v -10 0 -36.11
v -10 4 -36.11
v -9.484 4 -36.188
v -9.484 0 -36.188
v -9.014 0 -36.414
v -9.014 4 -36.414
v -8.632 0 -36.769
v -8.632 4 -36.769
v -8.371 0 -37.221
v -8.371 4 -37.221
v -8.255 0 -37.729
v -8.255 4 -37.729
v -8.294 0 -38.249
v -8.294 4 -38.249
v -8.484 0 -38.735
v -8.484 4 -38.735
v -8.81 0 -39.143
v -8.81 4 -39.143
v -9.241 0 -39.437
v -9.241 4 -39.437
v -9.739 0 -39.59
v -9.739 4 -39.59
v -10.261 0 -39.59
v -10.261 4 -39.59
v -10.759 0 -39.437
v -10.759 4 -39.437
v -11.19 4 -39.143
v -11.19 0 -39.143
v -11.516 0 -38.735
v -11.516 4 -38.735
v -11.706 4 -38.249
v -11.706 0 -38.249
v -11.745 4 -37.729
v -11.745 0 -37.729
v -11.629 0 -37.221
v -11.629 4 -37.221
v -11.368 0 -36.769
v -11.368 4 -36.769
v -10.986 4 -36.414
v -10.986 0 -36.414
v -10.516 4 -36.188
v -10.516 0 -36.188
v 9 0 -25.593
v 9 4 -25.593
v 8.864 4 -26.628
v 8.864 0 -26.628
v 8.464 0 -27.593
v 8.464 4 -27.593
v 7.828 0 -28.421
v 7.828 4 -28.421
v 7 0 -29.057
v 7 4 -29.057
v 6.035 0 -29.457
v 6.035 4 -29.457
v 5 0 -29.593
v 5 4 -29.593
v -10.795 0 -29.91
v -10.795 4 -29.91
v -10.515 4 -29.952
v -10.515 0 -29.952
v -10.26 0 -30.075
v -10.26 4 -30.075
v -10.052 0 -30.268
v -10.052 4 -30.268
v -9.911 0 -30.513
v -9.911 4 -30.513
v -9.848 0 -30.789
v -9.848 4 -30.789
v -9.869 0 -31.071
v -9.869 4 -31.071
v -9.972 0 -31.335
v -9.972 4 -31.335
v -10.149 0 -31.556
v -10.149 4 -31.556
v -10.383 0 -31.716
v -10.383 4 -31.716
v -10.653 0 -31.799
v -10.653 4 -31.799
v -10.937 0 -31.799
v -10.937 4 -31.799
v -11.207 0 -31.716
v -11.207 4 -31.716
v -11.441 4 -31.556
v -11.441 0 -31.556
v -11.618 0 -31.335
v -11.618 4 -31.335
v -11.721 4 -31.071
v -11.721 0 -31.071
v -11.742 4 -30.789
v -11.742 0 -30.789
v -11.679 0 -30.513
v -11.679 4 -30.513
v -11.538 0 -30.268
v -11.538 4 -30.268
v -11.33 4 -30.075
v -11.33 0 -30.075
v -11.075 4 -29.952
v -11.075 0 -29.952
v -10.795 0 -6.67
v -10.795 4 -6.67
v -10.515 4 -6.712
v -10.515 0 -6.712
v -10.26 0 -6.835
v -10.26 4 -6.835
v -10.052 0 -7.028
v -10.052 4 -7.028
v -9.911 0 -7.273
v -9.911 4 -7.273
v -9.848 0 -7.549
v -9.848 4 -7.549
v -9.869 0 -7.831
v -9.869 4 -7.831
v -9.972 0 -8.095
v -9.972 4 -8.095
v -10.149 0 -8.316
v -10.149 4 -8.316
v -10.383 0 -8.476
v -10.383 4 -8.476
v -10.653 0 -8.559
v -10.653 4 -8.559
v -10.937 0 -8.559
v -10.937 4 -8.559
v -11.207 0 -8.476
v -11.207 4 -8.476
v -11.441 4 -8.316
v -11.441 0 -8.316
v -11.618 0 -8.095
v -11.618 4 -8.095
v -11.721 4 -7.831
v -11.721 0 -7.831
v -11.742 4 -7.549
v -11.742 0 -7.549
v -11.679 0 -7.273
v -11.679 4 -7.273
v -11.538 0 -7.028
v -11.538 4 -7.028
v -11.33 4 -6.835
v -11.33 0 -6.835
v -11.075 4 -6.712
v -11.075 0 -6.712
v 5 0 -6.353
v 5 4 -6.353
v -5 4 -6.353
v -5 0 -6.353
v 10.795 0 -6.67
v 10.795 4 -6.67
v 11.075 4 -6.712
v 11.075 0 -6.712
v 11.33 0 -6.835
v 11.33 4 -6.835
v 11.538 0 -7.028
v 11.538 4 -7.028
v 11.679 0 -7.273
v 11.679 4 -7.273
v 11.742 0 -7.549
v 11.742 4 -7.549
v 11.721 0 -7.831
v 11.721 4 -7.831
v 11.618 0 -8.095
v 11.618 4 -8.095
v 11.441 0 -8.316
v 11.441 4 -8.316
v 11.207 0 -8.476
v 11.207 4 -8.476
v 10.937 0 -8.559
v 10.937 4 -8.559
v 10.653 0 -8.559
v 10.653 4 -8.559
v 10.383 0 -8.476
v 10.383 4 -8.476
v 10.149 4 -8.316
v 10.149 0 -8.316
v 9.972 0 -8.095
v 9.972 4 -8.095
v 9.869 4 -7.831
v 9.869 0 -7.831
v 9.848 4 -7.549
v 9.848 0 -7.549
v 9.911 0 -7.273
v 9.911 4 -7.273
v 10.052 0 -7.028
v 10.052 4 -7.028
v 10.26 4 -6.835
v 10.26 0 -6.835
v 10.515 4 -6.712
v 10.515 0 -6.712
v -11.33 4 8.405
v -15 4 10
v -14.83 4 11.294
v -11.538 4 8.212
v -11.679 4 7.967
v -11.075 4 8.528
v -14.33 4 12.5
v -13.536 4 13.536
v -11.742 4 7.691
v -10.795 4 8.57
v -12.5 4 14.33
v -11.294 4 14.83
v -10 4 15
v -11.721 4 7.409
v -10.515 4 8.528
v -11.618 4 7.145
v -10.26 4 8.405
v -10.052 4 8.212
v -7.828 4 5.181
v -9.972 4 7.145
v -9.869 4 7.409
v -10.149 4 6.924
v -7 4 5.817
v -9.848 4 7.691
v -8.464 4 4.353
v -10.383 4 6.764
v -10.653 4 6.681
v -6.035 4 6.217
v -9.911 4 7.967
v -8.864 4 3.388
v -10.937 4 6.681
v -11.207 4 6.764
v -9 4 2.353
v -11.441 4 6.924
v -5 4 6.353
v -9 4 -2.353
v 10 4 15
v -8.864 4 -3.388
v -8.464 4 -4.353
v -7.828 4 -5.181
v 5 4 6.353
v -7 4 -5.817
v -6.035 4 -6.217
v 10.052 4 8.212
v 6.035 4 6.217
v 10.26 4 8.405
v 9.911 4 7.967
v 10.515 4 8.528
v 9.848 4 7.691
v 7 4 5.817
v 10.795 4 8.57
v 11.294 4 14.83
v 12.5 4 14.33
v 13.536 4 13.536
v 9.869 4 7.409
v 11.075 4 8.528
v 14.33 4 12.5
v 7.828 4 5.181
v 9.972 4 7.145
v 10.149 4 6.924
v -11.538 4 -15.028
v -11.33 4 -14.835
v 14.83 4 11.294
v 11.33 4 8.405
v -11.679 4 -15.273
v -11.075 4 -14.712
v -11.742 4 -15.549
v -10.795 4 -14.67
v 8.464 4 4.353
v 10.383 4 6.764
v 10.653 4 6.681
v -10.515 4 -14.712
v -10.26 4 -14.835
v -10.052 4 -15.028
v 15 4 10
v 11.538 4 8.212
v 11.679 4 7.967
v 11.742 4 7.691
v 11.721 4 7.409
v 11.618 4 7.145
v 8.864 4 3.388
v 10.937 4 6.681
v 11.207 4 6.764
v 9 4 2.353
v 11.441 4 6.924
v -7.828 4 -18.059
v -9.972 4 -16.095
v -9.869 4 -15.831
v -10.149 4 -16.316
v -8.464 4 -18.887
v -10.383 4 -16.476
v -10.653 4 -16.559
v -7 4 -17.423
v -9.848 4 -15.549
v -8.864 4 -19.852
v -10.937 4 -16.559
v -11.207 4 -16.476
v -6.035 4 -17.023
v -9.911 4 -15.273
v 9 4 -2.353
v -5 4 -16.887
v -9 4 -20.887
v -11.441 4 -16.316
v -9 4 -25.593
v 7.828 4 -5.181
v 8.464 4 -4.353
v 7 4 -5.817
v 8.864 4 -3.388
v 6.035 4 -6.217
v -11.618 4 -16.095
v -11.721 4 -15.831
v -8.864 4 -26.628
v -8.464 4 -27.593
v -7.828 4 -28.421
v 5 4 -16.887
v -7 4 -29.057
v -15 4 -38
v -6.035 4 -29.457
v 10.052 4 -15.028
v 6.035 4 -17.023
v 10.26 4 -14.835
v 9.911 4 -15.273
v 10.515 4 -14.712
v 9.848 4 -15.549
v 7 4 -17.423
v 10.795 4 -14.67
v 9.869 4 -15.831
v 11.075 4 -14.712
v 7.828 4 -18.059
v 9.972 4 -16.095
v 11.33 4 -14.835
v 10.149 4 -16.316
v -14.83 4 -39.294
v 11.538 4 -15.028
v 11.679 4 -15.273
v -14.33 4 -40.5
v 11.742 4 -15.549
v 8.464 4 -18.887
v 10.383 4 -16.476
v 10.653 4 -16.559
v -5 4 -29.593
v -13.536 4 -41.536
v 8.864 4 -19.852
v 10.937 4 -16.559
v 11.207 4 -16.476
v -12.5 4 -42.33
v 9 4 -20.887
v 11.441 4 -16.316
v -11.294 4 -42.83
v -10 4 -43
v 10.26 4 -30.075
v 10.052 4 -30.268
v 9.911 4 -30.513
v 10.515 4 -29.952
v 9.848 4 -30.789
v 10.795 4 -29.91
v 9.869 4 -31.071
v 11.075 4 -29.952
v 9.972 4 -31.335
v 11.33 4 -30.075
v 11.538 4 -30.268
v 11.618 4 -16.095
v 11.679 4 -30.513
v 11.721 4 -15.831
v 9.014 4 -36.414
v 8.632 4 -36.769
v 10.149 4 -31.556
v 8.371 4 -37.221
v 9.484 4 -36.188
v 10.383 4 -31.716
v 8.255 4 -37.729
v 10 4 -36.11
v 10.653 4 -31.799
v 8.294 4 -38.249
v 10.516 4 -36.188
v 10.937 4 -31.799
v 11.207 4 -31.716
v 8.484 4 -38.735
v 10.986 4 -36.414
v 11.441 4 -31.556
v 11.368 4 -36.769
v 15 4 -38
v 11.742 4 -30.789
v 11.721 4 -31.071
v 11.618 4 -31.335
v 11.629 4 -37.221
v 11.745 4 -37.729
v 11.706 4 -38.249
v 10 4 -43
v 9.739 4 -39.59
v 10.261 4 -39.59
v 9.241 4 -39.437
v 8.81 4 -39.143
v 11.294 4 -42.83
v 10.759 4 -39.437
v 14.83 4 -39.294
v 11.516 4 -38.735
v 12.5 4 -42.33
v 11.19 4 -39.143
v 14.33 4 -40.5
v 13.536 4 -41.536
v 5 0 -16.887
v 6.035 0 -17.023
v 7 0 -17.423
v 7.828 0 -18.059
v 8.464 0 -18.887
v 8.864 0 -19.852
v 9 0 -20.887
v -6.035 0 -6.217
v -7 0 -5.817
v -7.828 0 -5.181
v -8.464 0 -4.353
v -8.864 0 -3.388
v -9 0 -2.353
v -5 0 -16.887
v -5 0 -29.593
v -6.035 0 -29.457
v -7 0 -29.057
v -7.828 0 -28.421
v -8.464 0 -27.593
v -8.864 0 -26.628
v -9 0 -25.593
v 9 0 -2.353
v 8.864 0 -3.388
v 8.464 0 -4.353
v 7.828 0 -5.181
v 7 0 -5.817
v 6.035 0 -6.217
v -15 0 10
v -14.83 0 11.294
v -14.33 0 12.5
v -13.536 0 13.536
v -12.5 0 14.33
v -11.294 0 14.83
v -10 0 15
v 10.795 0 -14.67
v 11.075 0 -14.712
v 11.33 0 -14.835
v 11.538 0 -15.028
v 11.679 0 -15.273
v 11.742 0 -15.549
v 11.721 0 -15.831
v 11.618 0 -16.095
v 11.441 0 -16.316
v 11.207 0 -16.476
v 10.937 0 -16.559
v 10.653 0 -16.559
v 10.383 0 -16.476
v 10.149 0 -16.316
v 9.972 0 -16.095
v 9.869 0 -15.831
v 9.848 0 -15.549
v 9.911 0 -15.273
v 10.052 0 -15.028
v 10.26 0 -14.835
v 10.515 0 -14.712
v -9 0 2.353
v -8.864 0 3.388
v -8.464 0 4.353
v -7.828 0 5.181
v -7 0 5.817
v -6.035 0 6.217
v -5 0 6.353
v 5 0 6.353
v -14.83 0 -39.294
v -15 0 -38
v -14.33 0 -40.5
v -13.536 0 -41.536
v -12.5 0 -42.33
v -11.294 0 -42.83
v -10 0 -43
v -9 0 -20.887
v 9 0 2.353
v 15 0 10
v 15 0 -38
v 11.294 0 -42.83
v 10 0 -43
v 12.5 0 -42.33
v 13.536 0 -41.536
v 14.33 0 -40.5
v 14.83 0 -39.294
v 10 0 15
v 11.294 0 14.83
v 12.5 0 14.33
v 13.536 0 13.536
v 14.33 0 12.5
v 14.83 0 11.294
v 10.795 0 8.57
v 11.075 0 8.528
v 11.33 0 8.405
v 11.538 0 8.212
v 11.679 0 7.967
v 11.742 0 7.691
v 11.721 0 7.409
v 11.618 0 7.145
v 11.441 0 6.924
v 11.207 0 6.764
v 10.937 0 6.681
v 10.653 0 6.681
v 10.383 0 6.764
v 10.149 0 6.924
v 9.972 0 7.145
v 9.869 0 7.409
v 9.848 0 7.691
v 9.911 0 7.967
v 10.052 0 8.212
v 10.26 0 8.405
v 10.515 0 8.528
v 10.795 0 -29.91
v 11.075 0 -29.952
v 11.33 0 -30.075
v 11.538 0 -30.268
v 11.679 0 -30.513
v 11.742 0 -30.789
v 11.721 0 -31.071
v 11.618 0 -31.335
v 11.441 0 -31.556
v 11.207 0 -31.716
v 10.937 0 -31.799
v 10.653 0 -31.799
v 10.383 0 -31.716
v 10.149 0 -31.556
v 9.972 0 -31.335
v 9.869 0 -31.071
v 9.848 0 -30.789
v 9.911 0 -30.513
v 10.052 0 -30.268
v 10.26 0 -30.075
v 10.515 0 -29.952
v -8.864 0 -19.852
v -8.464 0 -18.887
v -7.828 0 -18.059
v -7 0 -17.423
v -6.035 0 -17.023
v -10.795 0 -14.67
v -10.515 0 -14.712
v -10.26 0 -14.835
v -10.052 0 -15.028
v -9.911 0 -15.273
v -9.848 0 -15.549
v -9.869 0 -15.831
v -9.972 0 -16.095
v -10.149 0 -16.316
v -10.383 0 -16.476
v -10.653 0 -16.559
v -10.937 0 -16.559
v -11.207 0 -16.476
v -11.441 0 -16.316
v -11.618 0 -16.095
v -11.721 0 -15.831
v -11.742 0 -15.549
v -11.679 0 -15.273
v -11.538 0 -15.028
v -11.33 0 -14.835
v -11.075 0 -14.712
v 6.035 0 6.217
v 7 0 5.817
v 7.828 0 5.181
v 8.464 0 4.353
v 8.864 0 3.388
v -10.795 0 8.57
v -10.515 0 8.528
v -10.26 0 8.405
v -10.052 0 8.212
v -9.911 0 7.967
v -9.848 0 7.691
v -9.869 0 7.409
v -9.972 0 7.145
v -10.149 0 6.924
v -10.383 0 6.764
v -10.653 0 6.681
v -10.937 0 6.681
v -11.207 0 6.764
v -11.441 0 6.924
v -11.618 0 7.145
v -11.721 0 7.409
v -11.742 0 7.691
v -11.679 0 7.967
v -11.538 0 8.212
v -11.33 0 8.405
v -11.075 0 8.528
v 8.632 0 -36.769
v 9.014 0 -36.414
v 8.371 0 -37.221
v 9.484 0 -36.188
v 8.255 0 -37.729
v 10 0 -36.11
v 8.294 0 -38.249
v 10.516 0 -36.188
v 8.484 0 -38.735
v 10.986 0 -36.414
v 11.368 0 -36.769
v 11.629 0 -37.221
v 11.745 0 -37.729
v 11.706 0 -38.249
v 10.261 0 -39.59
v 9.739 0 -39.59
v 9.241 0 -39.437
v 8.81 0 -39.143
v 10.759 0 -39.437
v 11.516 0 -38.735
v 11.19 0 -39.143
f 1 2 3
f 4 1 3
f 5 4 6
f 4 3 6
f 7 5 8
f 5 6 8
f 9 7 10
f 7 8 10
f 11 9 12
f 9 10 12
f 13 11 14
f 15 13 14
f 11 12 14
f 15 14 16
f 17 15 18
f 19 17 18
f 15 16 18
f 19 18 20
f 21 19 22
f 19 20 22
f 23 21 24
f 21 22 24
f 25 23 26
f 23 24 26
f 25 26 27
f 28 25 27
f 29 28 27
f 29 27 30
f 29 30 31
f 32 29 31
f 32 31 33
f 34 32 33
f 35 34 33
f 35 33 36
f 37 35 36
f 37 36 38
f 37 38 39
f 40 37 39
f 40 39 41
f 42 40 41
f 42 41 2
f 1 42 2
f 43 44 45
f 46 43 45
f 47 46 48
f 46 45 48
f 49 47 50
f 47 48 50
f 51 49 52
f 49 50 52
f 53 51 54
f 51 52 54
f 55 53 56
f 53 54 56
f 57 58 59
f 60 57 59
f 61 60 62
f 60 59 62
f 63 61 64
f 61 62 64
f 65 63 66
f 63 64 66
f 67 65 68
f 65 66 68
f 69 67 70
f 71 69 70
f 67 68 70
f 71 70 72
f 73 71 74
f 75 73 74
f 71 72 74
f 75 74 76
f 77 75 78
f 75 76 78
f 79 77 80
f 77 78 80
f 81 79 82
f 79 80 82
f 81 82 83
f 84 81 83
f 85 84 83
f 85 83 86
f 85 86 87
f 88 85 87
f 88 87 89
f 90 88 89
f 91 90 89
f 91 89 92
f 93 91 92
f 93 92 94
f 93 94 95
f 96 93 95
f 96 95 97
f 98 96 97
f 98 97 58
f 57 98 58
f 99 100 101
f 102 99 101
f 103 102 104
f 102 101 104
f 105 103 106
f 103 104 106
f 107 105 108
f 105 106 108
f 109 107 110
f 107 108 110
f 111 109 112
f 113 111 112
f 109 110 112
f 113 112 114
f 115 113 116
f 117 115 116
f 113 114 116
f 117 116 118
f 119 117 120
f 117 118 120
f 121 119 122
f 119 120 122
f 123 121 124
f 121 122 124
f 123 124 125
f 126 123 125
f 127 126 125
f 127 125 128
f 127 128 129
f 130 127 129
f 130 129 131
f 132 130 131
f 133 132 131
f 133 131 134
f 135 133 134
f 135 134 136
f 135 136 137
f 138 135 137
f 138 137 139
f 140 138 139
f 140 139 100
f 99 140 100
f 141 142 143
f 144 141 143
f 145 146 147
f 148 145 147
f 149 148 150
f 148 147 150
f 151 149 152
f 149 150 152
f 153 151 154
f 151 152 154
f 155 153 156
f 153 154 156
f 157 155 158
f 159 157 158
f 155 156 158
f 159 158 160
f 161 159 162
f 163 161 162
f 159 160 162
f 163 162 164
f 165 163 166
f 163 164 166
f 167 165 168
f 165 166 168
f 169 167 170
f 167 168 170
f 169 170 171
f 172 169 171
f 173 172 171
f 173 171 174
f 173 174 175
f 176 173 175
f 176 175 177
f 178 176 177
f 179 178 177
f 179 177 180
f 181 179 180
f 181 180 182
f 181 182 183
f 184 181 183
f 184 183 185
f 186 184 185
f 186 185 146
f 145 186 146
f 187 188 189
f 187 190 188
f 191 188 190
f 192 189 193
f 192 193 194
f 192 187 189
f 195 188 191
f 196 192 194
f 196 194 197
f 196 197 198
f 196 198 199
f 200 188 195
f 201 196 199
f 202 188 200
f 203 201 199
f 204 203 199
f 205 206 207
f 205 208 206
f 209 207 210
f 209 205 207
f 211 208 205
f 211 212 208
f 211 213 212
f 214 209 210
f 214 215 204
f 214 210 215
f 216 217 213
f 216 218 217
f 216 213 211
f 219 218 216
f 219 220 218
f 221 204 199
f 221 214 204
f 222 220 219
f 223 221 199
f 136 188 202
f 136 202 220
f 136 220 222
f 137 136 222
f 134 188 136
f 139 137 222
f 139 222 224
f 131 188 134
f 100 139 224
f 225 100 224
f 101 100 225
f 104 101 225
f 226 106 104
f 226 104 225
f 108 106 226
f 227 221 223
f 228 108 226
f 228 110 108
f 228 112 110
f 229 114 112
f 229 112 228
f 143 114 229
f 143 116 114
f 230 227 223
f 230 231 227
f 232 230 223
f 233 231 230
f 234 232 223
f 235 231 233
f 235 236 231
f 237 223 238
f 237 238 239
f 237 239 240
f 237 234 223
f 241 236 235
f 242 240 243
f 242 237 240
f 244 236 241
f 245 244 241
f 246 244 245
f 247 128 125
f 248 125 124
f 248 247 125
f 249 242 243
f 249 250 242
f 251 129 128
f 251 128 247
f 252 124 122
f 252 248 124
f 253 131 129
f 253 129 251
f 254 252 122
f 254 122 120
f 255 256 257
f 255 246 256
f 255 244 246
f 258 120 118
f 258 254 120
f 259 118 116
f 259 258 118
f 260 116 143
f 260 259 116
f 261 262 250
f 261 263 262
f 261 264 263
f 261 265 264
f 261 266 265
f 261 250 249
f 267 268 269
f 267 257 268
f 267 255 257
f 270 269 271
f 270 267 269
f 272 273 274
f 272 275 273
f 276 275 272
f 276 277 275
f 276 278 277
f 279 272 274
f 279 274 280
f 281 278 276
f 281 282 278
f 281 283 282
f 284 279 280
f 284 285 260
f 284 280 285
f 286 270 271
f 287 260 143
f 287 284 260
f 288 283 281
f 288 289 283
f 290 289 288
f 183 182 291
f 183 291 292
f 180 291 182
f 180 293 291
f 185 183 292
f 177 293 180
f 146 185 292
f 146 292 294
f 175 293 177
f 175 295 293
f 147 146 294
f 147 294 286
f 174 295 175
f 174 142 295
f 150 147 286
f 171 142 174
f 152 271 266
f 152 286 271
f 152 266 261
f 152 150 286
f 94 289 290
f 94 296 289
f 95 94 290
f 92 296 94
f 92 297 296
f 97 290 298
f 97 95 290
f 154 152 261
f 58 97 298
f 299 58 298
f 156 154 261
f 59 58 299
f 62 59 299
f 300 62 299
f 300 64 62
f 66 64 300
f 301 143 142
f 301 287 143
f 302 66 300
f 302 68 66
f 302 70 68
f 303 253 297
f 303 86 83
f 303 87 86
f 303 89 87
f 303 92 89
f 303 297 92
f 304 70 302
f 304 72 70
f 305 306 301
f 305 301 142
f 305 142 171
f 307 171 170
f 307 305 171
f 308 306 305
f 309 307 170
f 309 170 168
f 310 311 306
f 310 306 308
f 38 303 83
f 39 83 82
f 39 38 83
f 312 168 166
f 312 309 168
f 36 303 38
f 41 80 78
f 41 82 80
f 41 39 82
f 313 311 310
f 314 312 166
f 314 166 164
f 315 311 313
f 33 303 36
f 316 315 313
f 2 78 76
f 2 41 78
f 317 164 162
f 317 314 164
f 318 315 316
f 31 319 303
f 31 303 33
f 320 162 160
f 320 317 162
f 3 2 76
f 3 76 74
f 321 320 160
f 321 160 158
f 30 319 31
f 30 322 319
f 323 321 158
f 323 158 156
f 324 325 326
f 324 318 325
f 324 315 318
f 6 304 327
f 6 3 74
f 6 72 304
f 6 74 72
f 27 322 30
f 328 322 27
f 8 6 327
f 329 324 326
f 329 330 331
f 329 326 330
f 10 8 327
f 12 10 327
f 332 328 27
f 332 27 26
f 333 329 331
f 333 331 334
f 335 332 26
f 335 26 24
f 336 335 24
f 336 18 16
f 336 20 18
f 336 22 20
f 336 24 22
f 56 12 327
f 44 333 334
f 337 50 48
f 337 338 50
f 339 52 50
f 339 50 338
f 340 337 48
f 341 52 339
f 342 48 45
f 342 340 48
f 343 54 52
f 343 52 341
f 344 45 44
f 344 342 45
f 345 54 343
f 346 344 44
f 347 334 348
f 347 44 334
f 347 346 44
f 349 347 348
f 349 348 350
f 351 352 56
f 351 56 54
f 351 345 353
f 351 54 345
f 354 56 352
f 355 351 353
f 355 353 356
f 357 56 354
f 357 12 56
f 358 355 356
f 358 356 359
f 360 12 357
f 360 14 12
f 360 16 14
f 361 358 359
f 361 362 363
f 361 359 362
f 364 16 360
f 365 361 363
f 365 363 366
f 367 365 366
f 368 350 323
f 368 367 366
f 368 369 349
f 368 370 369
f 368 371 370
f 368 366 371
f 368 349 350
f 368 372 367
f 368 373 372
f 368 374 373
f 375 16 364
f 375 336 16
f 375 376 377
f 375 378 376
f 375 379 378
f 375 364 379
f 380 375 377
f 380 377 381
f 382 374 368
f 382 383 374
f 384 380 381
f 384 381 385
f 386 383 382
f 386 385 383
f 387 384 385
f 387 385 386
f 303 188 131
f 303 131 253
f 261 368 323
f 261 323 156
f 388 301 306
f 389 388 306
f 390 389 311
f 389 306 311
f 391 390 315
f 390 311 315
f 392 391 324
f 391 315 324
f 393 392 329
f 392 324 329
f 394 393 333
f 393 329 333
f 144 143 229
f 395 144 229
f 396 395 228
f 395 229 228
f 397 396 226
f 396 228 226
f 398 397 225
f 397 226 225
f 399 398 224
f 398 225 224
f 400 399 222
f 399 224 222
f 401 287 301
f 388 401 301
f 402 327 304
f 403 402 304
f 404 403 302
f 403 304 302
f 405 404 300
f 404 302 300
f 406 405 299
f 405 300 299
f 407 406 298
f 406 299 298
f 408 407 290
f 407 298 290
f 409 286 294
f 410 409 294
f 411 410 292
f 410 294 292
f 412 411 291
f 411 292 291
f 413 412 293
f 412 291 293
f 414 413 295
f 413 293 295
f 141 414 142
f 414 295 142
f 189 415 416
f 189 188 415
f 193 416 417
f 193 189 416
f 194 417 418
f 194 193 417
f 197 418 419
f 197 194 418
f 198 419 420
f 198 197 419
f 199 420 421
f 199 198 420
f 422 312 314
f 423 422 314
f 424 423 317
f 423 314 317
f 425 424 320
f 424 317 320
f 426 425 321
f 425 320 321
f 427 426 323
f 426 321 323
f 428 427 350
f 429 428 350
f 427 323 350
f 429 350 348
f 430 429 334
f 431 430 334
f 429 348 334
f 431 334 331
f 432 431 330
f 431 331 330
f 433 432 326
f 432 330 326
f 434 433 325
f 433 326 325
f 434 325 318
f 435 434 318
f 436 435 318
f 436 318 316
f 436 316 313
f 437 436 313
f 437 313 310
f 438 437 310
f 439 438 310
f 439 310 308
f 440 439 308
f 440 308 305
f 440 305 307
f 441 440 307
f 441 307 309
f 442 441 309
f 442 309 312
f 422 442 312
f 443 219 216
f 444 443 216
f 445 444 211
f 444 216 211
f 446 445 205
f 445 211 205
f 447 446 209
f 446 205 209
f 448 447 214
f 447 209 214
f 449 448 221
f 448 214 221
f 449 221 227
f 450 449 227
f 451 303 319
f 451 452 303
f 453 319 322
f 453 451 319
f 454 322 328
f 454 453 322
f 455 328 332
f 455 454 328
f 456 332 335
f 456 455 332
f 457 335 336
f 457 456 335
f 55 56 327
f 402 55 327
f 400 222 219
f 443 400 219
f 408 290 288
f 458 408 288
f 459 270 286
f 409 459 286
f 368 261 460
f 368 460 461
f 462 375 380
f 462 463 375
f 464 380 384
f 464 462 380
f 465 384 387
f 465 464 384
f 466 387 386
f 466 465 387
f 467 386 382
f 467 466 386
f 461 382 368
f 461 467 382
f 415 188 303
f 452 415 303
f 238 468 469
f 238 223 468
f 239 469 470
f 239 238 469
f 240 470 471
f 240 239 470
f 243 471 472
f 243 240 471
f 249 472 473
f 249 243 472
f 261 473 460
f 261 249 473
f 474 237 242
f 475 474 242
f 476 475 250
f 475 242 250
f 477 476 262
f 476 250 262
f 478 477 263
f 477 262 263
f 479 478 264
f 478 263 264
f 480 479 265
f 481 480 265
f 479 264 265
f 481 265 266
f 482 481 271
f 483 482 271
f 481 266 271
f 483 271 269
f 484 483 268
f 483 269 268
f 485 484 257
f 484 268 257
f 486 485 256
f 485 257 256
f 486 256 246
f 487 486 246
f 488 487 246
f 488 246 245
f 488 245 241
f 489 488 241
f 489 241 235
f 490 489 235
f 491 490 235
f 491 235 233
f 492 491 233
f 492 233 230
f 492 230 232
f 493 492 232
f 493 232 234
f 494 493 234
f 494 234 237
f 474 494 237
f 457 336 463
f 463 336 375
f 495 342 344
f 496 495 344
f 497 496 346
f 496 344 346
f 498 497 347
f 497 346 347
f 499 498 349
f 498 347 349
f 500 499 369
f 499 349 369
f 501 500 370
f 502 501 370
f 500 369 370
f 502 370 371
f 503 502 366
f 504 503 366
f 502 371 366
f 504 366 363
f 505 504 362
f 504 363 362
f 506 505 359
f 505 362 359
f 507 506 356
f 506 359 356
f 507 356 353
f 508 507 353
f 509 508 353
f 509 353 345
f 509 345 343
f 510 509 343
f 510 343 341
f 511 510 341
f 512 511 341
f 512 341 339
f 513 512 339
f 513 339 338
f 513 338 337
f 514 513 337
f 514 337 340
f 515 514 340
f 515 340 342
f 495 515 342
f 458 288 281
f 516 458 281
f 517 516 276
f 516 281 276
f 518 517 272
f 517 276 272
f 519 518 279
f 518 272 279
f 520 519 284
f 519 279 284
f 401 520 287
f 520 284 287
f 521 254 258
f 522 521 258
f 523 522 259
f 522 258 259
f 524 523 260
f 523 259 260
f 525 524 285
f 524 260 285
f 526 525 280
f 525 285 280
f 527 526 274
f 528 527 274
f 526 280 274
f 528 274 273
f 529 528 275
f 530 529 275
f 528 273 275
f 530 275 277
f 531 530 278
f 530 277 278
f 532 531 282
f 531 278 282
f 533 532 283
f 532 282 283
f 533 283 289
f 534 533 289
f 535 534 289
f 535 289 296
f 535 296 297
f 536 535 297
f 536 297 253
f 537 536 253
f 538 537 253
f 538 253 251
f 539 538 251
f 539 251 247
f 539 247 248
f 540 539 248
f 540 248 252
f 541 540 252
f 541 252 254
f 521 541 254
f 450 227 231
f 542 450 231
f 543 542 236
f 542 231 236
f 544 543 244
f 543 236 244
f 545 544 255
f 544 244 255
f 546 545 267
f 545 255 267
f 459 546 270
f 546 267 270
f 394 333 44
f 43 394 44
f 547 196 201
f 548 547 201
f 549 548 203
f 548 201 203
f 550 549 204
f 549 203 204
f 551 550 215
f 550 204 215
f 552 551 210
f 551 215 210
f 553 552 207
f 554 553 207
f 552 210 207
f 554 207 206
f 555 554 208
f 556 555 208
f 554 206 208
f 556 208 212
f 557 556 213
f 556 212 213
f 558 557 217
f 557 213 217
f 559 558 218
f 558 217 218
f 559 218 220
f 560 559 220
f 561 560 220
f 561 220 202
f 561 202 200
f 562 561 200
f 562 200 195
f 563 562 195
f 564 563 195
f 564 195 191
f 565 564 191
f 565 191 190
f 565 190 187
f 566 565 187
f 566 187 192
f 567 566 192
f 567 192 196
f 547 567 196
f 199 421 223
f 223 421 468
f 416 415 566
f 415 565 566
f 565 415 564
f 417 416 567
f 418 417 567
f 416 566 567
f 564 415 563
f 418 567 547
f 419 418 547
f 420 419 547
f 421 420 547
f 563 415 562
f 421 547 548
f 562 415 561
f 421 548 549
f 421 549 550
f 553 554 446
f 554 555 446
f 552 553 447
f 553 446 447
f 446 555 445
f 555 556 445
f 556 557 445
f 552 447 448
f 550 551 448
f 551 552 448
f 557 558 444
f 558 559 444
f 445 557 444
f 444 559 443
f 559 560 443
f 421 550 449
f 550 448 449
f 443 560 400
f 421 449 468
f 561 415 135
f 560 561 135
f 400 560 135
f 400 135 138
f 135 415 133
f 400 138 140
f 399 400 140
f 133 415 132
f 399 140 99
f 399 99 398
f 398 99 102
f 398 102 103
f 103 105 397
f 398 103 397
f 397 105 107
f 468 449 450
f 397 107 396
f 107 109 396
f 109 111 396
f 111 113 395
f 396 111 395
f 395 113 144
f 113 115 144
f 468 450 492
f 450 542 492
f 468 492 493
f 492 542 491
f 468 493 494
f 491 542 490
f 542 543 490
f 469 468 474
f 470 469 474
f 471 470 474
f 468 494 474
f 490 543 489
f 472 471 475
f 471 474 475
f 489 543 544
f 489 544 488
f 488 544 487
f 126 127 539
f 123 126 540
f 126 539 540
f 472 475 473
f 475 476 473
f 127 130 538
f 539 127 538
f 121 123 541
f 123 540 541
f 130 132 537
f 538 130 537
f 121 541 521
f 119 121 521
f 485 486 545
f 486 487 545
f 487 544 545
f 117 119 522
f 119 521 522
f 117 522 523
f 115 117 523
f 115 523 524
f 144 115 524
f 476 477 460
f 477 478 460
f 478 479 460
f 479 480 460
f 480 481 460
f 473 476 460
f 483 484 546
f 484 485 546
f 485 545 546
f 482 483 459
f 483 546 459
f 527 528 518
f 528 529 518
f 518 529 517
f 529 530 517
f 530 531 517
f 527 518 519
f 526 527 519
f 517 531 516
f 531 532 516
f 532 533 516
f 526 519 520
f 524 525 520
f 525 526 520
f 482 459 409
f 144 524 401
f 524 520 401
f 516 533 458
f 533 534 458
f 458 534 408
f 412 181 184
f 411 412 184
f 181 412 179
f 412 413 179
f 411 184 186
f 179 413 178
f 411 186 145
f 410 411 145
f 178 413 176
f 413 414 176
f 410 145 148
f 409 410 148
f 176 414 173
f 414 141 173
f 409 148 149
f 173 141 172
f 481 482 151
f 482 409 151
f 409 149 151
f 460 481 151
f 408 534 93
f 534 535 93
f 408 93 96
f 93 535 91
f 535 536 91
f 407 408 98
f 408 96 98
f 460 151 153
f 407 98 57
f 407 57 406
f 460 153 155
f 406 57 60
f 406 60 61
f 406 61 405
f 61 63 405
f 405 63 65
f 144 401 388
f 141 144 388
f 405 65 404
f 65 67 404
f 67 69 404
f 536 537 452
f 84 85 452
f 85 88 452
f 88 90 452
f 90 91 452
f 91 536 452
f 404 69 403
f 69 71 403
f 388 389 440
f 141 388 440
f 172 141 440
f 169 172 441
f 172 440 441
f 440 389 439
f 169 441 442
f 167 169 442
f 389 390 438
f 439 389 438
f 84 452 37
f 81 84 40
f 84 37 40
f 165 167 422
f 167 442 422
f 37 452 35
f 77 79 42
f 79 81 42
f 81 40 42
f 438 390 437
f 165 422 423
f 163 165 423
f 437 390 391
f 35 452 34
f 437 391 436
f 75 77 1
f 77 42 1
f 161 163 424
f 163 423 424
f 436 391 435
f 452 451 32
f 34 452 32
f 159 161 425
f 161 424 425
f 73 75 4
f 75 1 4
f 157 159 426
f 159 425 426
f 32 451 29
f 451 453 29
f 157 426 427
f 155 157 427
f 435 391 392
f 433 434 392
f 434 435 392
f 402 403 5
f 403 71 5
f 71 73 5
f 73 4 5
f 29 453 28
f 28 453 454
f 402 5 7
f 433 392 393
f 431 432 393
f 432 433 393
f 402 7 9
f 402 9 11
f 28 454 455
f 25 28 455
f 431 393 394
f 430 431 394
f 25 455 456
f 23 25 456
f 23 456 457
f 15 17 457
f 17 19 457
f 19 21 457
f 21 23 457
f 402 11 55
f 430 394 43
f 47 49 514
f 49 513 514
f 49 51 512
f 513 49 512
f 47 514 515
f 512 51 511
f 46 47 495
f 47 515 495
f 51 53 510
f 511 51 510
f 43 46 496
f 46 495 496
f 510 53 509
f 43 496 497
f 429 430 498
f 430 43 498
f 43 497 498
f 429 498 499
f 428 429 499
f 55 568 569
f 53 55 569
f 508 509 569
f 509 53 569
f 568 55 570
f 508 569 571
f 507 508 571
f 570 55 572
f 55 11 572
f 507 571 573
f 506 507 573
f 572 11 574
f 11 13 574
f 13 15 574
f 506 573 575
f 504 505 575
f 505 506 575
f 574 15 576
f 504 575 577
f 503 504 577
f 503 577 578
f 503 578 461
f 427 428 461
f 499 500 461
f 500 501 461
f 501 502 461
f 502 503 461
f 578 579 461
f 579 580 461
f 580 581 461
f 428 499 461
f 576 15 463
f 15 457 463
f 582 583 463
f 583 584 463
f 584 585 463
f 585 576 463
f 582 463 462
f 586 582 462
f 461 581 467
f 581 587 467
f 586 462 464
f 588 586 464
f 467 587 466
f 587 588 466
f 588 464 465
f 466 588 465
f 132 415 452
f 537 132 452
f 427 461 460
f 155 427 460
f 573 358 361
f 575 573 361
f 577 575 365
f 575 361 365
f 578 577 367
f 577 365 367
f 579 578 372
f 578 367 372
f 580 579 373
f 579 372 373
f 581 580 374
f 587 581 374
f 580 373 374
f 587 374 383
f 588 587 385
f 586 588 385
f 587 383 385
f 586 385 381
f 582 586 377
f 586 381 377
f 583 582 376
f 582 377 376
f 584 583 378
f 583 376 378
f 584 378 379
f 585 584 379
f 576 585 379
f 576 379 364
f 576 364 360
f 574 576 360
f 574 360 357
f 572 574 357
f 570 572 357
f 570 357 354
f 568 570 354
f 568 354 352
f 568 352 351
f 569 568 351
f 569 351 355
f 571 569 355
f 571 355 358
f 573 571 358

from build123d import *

# Parameters (mm, degrees)
SKETCH1_W           = 30
SKETCH1_H           = 30
BOSS_EXTRUDE1_DEPTH = 4
SKETCH3_W           = 30
SKETCH3_H           = 28
BOSS_EXTRUDE2_DEPTH = 4
SKETCH2_R           = 0.95
SKETCH2_R_2         = 1.75
CUT_EXTRUDE1_DEPTH  = 46.716517803
FILLET1_R           = 5


with BuildPart() as part:
    # Sketch1 → Boss-Extrude1 (new body)
    with BuildSketch(Plane(origin=(0, 0, 0), x_dir=(1, 0, 0), z_dir=(0, 1, 0))):
        Rectangle(SKETCH1_W, SKETCH1_H)
    extrude(amount=BOSS_EXTRUDE1_DEPTH)

    # Sketch3 → Boss-Extrude2 (add)
    with BuildSketch(Plane(origin=(0, 4, 0), x_dir=(1, 0, 0), z_dir=(0, 1, 0))):
        with Locations((0, 29)):
            Rectangle(SKETCH3_W, SKETCH3_H)
    extrude(amount=-BOSS_EXTRUDE2_DEPTH)

    # Sketch2 → Cut-Extrude1 (cut, through all)
    with BuildSketch(Plane(origin=(0, 4, 0), x_dir=(1, 0, 0), z_dir=(0, 1, 0))):
        with Locations(Location((-10.795, -7.62, 0), (0, 0, 270))):
            Circle(SKETCH2_R)
        with Locations(Location((10.795, -7.62, 0), (0, 0, 270))):
            Circle(SKETCH2_R)
        with Locations(Location((10.795, 7.62, 0), (0, 0, 270))):
            Circle(SKETCH2_R)
        with Locations(Location((-10.795, 7.62, 0), (0, 0, 270))):
            Circle(SKETCH2_R)
        with Locations(Location((-10.795, 30.86, 0), (0, 0, 270))):
            Circle(SKETCH2_R)
        with Locations(Location((10.795, 30.86, 0), (0, 0, 270))):
            Circle(SKETCH2_R)
        with Locations(Location((10.795, 15.62, 0), (0, 0, 270))):
            Circle(SKETCH2_R)
        with Locations(Location((-10.795, 15.62, 0), (0, 0, 270))):
            Circle(SKETCH2_R)
        with Locations(Location((-10, 37.86, 0), (0, 0, 270))):
            Circle(SKETCH2_R_2)
        with Locations(Location((10, 37.86, 0), (0, 0, 270))):
            Circle(SKETCH2_R_2)
        with BuildLine():
            Line((-5, -6.352941176), (5, -6.352941176))
            ThreePointArc((5, -6.352941176), (7.828427125, -5.181368301), (9, -2.352941176))
            Line((9, -2.352941176), (9, 2.352941176))
            ThreePointArc((9, 2.352941176), (7.828427125, 5.181368301), (5, 6.352941176))
            Line((5, 6.352941176), (-5, 6.352941176))
            ThreePointArc((-5, 6.352941176), (-7.828427125, 5.181368301), (-9, 2.352941176))
            Line((-9, 2.352941176), (-9, -2.352941176))
            ThreePointArc((-9, -2.352941176), (-7.828427125, -5.181368301), (-5, -6.352941176))
        make_face()
        with BuildLine():
            Line((-5, 16.887058824), (5, 16.887058824))
            ThreePointArc((5, 16.887058824), (7.828427125, 18.058631699), (9, 20.887058824))
            Line((9, 20.887058824), (9, 25.592941176))
            ThreePointArc((9, 25.592941176), (7.828427125, 28.421368301), (5, 29.592941176))
            Line((5, 29.592941176), (-5, 29.592941176))
            ThreePointArc((-5, 29.592941176), (-7.828427125, 28.421368301), (-9, 25.592941176))
            Line((-9, 25.592941176), (-9, 20.887058824))
            ThreePointArc((-9, 20.887058824), (-7.828427125, 18.058631699), (-5, 16.887058824))
        make_face()
    extrude(amount=-CUT_EXTRUDE1_DEPTH, mode=Mode.SUBTRACT)

    # Fillet1
    fillet1_edges = [part.edges().sort_by_distance(p)[0] for p in [
        (15, 2, -43),
        (-15, 2, -43),
        (15, 2, 15),
        (-15, 2, 15),
    ]]
    fillet(fillet1_edges, radius=FILLET1_R)


solid = part.part
